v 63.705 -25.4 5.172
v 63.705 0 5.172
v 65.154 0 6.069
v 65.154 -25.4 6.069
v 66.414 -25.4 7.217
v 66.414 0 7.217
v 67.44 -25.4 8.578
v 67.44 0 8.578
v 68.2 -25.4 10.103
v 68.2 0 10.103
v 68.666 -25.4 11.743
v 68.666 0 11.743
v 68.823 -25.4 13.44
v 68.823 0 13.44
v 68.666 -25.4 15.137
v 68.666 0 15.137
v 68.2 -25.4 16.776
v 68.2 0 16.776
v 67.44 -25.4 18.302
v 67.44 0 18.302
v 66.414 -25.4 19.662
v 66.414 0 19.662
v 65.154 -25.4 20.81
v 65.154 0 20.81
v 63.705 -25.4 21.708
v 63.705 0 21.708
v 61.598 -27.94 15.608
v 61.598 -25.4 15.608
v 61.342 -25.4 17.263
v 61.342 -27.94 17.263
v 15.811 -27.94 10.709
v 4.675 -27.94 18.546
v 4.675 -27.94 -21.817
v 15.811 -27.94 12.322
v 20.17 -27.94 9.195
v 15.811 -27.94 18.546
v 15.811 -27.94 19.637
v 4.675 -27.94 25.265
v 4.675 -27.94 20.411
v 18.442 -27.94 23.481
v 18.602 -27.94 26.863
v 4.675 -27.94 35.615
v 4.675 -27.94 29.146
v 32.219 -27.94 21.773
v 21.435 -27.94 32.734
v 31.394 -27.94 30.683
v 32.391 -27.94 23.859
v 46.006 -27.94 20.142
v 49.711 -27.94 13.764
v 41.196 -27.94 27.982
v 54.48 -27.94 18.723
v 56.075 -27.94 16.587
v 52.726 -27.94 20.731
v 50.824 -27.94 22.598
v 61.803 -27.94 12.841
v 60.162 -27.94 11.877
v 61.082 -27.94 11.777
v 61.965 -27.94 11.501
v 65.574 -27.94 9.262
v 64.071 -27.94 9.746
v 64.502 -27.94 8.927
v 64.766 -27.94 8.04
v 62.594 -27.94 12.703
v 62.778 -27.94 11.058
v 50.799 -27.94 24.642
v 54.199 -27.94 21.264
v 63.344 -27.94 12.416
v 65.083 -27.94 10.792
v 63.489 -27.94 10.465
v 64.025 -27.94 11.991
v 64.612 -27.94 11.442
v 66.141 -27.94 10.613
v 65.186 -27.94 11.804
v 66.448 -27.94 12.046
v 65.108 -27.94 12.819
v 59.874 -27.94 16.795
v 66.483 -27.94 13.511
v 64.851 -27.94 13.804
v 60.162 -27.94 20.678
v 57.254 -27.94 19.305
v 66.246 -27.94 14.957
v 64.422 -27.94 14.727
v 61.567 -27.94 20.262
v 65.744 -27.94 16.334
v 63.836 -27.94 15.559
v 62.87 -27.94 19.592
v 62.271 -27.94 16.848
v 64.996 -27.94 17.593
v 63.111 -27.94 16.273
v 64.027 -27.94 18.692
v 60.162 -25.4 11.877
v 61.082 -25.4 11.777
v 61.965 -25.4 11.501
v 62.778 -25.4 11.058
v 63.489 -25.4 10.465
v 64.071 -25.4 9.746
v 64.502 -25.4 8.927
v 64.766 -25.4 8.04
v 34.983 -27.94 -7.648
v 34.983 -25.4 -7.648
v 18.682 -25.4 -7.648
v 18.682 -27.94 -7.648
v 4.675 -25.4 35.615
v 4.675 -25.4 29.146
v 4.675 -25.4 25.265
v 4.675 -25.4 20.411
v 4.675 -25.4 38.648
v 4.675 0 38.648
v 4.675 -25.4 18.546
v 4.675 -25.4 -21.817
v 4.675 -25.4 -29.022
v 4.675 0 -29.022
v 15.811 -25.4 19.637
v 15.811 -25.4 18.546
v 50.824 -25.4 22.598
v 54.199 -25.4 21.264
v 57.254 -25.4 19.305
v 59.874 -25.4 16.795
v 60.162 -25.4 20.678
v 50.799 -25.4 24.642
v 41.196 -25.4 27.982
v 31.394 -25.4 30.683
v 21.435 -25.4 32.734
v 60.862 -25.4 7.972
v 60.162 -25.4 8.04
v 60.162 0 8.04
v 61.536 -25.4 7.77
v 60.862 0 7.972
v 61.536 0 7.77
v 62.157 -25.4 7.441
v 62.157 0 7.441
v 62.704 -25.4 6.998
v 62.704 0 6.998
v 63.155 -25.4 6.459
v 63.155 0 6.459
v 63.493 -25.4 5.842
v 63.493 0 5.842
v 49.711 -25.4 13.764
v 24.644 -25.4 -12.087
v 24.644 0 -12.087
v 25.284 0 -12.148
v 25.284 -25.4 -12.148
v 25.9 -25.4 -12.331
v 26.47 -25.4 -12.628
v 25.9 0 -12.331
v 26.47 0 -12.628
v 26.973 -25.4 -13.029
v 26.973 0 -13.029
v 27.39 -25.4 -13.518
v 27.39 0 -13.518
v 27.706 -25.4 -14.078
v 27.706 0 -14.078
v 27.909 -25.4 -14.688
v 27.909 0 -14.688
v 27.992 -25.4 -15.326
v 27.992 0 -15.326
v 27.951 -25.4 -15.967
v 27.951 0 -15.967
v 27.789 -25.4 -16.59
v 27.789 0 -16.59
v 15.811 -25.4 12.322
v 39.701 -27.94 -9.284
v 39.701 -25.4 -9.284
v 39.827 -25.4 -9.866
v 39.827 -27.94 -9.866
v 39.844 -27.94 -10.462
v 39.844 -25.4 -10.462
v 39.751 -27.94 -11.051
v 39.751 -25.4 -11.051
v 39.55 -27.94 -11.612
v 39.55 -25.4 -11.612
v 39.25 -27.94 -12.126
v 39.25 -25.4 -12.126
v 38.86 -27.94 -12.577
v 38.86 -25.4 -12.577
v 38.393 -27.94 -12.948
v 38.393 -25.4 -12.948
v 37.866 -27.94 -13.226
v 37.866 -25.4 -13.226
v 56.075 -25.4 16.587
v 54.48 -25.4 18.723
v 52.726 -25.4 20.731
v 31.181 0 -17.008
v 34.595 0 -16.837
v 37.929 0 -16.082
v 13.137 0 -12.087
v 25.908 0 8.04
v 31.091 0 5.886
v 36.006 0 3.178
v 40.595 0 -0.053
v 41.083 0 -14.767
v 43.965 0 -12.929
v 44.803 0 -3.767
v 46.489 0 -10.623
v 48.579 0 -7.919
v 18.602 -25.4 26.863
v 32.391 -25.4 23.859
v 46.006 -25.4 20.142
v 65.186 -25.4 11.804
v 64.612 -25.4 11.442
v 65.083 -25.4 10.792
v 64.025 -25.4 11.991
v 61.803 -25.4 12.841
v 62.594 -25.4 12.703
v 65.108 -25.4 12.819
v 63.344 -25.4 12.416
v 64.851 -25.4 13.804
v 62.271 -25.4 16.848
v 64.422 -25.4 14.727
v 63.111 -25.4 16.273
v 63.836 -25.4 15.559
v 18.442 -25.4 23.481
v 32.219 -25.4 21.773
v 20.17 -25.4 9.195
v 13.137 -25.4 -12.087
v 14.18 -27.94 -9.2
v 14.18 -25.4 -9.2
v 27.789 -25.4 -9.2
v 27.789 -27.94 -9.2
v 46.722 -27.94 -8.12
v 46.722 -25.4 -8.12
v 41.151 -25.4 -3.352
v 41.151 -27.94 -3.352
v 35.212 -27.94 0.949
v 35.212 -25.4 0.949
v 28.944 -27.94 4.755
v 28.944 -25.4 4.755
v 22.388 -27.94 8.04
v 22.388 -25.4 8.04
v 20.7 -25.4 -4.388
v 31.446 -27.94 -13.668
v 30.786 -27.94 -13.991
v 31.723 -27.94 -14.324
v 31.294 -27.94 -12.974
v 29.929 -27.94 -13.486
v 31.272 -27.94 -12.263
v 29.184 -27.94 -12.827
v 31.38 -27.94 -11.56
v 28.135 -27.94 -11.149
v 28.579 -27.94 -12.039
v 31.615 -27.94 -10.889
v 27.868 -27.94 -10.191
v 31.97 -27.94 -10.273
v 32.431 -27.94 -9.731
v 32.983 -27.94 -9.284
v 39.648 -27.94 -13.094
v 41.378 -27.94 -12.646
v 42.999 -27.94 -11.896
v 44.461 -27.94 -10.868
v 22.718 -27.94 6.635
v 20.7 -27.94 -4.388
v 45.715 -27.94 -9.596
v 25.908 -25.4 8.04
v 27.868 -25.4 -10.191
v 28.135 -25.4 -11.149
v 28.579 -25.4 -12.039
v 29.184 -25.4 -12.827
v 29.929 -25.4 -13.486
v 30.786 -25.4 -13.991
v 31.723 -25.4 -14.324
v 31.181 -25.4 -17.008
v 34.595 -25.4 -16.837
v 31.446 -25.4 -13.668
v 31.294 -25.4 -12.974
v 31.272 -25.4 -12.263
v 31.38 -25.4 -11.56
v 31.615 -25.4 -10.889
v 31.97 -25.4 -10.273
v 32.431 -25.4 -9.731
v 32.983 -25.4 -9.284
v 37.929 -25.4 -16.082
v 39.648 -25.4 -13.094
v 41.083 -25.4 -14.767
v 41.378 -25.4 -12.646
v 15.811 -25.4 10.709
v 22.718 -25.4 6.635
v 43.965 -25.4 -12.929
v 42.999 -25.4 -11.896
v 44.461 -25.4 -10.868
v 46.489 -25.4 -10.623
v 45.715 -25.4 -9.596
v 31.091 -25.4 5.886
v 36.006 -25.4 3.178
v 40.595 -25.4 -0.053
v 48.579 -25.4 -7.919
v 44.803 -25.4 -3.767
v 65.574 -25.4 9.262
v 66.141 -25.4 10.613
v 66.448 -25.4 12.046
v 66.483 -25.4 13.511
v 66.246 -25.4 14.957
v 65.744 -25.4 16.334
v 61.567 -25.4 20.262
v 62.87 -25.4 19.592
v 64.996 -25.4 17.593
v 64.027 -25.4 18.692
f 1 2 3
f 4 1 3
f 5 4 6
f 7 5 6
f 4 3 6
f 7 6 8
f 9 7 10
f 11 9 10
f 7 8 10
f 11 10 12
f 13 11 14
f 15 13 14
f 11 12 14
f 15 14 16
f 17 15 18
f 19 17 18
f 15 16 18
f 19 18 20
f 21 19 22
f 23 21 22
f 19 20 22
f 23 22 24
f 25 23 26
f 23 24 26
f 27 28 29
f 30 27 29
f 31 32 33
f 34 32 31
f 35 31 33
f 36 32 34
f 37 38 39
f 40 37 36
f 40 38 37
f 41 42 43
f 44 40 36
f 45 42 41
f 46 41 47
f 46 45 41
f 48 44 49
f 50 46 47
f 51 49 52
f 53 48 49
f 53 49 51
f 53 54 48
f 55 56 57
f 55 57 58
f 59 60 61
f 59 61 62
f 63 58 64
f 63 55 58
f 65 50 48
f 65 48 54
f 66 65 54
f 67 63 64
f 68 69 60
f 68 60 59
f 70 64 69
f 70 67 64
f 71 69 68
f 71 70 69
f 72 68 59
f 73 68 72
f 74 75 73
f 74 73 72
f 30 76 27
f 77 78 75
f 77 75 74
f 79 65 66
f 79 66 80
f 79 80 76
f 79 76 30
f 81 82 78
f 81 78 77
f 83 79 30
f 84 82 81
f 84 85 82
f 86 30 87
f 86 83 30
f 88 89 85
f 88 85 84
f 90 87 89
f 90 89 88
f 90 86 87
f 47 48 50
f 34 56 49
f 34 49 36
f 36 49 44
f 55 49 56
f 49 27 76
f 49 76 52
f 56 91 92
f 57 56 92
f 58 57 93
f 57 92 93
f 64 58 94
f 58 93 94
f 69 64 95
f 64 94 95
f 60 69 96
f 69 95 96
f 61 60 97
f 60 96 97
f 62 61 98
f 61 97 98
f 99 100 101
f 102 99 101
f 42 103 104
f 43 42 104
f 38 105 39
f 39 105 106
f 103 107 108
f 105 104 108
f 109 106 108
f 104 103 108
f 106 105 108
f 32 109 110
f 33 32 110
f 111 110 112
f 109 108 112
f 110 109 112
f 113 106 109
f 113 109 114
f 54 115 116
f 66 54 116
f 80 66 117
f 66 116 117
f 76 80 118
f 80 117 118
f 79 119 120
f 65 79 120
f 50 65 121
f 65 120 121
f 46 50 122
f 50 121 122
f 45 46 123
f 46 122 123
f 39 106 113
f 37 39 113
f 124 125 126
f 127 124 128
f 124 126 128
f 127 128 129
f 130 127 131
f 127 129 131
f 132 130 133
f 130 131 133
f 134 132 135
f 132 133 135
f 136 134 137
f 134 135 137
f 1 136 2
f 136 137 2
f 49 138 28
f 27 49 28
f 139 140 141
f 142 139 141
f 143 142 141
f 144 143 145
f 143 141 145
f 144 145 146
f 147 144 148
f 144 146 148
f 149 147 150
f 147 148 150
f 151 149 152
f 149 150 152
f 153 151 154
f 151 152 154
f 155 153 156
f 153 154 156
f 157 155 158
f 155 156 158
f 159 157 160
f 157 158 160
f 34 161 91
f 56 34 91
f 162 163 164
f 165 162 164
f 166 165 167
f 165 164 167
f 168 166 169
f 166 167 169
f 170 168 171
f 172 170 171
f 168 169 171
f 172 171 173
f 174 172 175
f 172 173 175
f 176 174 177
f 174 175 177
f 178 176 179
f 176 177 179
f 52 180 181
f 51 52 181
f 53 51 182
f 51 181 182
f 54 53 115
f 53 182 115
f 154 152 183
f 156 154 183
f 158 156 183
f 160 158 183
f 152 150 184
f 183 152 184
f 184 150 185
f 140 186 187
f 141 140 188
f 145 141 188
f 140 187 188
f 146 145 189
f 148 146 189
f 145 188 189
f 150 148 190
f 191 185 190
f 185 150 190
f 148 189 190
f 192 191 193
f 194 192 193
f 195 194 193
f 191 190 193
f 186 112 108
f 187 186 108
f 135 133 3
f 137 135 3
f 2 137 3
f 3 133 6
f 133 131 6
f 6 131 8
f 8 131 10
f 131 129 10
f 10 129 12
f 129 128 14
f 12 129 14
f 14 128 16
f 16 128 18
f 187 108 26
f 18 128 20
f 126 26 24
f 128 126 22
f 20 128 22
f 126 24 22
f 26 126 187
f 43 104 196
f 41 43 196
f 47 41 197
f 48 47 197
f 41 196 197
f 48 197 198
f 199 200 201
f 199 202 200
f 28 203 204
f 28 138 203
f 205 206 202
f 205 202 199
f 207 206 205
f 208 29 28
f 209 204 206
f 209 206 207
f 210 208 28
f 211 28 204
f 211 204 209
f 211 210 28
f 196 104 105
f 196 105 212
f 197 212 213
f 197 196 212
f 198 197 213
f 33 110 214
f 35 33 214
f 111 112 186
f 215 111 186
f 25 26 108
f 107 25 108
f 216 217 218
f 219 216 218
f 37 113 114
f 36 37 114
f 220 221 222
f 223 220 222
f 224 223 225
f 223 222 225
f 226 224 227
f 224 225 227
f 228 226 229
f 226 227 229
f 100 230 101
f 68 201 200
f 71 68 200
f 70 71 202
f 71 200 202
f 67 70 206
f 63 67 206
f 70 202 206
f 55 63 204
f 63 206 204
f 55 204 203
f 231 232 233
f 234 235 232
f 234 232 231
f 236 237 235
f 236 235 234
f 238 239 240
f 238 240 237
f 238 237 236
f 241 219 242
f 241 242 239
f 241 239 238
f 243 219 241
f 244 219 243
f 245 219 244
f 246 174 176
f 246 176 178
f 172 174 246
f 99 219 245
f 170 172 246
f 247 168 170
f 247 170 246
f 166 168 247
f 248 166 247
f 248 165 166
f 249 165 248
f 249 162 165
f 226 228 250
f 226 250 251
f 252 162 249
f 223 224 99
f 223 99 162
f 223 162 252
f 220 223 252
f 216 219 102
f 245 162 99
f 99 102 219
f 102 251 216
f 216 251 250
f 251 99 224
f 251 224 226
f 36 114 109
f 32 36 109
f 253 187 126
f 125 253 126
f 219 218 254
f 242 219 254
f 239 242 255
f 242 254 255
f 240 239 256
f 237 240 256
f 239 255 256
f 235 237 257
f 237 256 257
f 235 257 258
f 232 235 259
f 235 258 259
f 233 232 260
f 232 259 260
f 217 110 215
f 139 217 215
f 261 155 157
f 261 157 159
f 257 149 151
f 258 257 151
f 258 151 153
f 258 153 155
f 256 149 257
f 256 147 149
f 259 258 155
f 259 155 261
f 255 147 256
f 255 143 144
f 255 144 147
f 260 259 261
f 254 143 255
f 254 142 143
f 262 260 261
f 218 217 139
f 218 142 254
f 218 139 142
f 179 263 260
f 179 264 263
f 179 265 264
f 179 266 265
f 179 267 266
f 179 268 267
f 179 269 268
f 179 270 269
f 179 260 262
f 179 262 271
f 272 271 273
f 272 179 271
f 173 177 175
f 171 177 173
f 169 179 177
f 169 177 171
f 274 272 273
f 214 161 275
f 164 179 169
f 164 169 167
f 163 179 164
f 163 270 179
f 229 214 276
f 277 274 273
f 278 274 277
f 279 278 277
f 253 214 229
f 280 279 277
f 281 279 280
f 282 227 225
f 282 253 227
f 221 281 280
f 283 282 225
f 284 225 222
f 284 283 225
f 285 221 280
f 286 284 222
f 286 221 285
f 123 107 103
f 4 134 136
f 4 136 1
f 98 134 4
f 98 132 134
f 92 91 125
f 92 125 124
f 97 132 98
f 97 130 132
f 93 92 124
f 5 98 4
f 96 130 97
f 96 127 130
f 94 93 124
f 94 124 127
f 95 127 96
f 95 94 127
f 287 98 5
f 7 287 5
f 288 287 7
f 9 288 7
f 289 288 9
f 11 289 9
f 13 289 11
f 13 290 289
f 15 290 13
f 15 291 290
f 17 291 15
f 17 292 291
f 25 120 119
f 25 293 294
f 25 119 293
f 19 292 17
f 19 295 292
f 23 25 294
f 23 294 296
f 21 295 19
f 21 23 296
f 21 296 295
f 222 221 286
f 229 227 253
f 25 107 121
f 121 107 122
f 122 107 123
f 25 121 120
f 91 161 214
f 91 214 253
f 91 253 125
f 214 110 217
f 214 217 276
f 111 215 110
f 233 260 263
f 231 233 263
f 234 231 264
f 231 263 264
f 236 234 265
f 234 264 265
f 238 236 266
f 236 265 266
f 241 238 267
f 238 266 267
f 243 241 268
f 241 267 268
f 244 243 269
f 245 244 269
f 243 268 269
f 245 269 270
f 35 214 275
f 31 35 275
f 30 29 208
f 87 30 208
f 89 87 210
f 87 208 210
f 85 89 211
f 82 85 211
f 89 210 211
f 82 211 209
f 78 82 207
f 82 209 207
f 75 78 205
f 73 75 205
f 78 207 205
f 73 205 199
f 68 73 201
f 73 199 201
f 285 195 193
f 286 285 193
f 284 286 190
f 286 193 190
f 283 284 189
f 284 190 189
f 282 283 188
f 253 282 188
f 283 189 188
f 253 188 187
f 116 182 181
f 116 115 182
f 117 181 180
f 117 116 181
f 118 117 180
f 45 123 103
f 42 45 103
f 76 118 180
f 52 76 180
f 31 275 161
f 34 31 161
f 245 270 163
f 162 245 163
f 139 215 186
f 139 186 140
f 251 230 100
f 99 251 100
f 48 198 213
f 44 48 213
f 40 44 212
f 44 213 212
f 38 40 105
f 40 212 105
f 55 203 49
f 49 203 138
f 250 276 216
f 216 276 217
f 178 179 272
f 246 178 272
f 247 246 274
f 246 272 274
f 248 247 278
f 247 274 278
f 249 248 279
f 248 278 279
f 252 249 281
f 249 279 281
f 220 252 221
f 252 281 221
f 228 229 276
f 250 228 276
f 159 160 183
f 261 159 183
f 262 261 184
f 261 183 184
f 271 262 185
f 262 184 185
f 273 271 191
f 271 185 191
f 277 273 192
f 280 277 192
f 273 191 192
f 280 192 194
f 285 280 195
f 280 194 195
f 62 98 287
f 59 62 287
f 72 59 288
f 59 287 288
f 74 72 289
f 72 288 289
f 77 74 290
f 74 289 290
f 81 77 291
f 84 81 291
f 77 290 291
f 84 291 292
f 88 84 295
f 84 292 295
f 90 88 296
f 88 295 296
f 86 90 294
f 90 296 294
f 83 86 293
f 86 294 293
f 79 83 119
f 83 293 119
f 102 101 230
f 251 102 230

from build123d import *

# Parameters (mm, degrees)
F1_DEPTH = 25.4
F3_DEPTH = 2.54


with BuildPart() as f1:
    # F0 (on Front) → F1 (new body)
    with BuildSketch(Plane.XZ):
        with BuildLine():
            Line((4.675265, 38.648338), (4.675265, -29.022353))
            Line((4.675265, -29.022353), (13.136835, -12.086689))
            Line((13.136835, -12.086689), (24.644025, -12.086689))
            ThreePointArc((24.644025, -12.086689), (27.390181, -13.518342), (27.788887, -16.589504))
            ThreePointArc((27.788887, -16.589504), (39.534536, -15.492547), (48.578784, -7.918567))
            ThreePointArc((48.578784, -7.918567), (38.344977, 1.625304), (25.908433, 8.040027))
            Line((25.908433, 8.040027), (60.161997, 8.040027))
            ThreePointArc((60.161997, 8.040027), (62.441504, 7.233012), (63.705467, 5.171502))
            ThreePointArc((63.705467, 5.171502), (68.823481, 13.439604), (63.705467, 21.707706))
            Line((63.705467, 21.707706), (4.675265, 38.648338))
        make_face()
    extrude(amount=F1_DEPTH)

    # F2 (on face) → F3 (join)
    with BuildSketch(Plane.XZ.offset(25.4)):
        with BuildLine():
            ThreePointArc((4.675265, 29.146321), (25.516102, 25.450284), (46.005655, 20.141857))
            ThreePointArc((46.005655, 20.141857), (25.329763, 22.617176), (4.675265, 25.265086))
            Line((4.675265, 25.265086), (4.675265, 20.410509))
            Line((4.675265, 20.410509), (15.810639, 19.637108))
            Line((15.810639, 19.637108), (15.810639, 18.545922))
            Line((15.810639, 18.545922), (4.675265, 18.545922))
            Line((4.675265, 18.545922), (4.675265, -21.817246))
            Line((4.675265, -21.817246), (20.169701, 9.19456))
            Line((20.169701, 9.19456), (15.810639, 10.708986))
            Line((15.810639, 10.708986), (15.810639, 12.321869))
            Line((15.810639, 12.321869), (60.161997, 11.876815))
            ThreePointArc((60.161997, 11.876815), (63.147761, 10.778846), (64.766154, 8.040027))
            ThreePointArc((64.766154, 8.040027), (66.027213, 15.656968), (60.161997, 20.677656))
            ThreePointArc((60.161997, 20.677656), (41.195878, 27.981513), (21.435434, 32.733861))
            Line((21.435434, 32.733861), (4.675265, 35.614753))
            Line((4.675265, 35.614753), (4.675265, 29.146321))
        make_face()
        with BuildLine():
            Line((61.803415, 12.841351), (49.711283, 13.763633))
            Line((49.711283, 13.763633), (61.598465, 15.608195))
            Line((61.598465, 15.608195), (61.341725, 17.26274))
            ThreePointArc((61.341725, 17.26274), (64.422395, 14.726928), (65.082639, 10.791837))
            ThreePointArc((65.082639, 10.791837), (63.695147, 12.219986), (61.803415, 12.841351))
        make_face(mode=Mode.SUBTRACT)
        with BuildLine():
            Line((59.874482, 16.794579), (56.074578, 16.587311))
            ThreePointArc((56.074578, 16.587311), (53.621941, 19.743599), (50.823804, 22.598071))
            ThreePointArc((50.823804, 22.598071), (55.773558, 20.35821), (59.874482, 16.794579))
        make_face(mode=Mode.SUBTRACT)
        with BuildLine():
            Line((22.387989, 8.040027), (22.718249, 6.635162))
            Line((22.718249, 6.635162), (14.179533, -9.200274))
            Line((14.179533, -9.200274), (27.788887, -9.200274))
            ThreePointArc((27.788887, -9.200274), (28.86277, -12.447594), (31.722713, -14.323504))
            ThreePointArc((31.722713, -14.323504), (31.380156, -11.560312), (32.983219, -9.283744))
            Line((32.983219, -9.283744), (39.701112, -9.283744))
            ThreePointArc((39.701112, -9.283744), (39.55028, -11.611776), (37.866078, -13.22607))
            ThreePointArc((37.866078, -13.22607), (42.999226, -11.895955), (46.722099, -8.119896))
            ThreePointArc((46.722099, -8.119896), (35.211974, 0.949291), (22.387989, 8.040027))
        make_face()
        Polygon((18.681765, -7.64778), (20.700006, -4.387544), (34.982949, -7.64778), align=None, mode=Mode.SUBTRACT)
    extrude(amount=F3_DEPTH)


solid = f1.part
